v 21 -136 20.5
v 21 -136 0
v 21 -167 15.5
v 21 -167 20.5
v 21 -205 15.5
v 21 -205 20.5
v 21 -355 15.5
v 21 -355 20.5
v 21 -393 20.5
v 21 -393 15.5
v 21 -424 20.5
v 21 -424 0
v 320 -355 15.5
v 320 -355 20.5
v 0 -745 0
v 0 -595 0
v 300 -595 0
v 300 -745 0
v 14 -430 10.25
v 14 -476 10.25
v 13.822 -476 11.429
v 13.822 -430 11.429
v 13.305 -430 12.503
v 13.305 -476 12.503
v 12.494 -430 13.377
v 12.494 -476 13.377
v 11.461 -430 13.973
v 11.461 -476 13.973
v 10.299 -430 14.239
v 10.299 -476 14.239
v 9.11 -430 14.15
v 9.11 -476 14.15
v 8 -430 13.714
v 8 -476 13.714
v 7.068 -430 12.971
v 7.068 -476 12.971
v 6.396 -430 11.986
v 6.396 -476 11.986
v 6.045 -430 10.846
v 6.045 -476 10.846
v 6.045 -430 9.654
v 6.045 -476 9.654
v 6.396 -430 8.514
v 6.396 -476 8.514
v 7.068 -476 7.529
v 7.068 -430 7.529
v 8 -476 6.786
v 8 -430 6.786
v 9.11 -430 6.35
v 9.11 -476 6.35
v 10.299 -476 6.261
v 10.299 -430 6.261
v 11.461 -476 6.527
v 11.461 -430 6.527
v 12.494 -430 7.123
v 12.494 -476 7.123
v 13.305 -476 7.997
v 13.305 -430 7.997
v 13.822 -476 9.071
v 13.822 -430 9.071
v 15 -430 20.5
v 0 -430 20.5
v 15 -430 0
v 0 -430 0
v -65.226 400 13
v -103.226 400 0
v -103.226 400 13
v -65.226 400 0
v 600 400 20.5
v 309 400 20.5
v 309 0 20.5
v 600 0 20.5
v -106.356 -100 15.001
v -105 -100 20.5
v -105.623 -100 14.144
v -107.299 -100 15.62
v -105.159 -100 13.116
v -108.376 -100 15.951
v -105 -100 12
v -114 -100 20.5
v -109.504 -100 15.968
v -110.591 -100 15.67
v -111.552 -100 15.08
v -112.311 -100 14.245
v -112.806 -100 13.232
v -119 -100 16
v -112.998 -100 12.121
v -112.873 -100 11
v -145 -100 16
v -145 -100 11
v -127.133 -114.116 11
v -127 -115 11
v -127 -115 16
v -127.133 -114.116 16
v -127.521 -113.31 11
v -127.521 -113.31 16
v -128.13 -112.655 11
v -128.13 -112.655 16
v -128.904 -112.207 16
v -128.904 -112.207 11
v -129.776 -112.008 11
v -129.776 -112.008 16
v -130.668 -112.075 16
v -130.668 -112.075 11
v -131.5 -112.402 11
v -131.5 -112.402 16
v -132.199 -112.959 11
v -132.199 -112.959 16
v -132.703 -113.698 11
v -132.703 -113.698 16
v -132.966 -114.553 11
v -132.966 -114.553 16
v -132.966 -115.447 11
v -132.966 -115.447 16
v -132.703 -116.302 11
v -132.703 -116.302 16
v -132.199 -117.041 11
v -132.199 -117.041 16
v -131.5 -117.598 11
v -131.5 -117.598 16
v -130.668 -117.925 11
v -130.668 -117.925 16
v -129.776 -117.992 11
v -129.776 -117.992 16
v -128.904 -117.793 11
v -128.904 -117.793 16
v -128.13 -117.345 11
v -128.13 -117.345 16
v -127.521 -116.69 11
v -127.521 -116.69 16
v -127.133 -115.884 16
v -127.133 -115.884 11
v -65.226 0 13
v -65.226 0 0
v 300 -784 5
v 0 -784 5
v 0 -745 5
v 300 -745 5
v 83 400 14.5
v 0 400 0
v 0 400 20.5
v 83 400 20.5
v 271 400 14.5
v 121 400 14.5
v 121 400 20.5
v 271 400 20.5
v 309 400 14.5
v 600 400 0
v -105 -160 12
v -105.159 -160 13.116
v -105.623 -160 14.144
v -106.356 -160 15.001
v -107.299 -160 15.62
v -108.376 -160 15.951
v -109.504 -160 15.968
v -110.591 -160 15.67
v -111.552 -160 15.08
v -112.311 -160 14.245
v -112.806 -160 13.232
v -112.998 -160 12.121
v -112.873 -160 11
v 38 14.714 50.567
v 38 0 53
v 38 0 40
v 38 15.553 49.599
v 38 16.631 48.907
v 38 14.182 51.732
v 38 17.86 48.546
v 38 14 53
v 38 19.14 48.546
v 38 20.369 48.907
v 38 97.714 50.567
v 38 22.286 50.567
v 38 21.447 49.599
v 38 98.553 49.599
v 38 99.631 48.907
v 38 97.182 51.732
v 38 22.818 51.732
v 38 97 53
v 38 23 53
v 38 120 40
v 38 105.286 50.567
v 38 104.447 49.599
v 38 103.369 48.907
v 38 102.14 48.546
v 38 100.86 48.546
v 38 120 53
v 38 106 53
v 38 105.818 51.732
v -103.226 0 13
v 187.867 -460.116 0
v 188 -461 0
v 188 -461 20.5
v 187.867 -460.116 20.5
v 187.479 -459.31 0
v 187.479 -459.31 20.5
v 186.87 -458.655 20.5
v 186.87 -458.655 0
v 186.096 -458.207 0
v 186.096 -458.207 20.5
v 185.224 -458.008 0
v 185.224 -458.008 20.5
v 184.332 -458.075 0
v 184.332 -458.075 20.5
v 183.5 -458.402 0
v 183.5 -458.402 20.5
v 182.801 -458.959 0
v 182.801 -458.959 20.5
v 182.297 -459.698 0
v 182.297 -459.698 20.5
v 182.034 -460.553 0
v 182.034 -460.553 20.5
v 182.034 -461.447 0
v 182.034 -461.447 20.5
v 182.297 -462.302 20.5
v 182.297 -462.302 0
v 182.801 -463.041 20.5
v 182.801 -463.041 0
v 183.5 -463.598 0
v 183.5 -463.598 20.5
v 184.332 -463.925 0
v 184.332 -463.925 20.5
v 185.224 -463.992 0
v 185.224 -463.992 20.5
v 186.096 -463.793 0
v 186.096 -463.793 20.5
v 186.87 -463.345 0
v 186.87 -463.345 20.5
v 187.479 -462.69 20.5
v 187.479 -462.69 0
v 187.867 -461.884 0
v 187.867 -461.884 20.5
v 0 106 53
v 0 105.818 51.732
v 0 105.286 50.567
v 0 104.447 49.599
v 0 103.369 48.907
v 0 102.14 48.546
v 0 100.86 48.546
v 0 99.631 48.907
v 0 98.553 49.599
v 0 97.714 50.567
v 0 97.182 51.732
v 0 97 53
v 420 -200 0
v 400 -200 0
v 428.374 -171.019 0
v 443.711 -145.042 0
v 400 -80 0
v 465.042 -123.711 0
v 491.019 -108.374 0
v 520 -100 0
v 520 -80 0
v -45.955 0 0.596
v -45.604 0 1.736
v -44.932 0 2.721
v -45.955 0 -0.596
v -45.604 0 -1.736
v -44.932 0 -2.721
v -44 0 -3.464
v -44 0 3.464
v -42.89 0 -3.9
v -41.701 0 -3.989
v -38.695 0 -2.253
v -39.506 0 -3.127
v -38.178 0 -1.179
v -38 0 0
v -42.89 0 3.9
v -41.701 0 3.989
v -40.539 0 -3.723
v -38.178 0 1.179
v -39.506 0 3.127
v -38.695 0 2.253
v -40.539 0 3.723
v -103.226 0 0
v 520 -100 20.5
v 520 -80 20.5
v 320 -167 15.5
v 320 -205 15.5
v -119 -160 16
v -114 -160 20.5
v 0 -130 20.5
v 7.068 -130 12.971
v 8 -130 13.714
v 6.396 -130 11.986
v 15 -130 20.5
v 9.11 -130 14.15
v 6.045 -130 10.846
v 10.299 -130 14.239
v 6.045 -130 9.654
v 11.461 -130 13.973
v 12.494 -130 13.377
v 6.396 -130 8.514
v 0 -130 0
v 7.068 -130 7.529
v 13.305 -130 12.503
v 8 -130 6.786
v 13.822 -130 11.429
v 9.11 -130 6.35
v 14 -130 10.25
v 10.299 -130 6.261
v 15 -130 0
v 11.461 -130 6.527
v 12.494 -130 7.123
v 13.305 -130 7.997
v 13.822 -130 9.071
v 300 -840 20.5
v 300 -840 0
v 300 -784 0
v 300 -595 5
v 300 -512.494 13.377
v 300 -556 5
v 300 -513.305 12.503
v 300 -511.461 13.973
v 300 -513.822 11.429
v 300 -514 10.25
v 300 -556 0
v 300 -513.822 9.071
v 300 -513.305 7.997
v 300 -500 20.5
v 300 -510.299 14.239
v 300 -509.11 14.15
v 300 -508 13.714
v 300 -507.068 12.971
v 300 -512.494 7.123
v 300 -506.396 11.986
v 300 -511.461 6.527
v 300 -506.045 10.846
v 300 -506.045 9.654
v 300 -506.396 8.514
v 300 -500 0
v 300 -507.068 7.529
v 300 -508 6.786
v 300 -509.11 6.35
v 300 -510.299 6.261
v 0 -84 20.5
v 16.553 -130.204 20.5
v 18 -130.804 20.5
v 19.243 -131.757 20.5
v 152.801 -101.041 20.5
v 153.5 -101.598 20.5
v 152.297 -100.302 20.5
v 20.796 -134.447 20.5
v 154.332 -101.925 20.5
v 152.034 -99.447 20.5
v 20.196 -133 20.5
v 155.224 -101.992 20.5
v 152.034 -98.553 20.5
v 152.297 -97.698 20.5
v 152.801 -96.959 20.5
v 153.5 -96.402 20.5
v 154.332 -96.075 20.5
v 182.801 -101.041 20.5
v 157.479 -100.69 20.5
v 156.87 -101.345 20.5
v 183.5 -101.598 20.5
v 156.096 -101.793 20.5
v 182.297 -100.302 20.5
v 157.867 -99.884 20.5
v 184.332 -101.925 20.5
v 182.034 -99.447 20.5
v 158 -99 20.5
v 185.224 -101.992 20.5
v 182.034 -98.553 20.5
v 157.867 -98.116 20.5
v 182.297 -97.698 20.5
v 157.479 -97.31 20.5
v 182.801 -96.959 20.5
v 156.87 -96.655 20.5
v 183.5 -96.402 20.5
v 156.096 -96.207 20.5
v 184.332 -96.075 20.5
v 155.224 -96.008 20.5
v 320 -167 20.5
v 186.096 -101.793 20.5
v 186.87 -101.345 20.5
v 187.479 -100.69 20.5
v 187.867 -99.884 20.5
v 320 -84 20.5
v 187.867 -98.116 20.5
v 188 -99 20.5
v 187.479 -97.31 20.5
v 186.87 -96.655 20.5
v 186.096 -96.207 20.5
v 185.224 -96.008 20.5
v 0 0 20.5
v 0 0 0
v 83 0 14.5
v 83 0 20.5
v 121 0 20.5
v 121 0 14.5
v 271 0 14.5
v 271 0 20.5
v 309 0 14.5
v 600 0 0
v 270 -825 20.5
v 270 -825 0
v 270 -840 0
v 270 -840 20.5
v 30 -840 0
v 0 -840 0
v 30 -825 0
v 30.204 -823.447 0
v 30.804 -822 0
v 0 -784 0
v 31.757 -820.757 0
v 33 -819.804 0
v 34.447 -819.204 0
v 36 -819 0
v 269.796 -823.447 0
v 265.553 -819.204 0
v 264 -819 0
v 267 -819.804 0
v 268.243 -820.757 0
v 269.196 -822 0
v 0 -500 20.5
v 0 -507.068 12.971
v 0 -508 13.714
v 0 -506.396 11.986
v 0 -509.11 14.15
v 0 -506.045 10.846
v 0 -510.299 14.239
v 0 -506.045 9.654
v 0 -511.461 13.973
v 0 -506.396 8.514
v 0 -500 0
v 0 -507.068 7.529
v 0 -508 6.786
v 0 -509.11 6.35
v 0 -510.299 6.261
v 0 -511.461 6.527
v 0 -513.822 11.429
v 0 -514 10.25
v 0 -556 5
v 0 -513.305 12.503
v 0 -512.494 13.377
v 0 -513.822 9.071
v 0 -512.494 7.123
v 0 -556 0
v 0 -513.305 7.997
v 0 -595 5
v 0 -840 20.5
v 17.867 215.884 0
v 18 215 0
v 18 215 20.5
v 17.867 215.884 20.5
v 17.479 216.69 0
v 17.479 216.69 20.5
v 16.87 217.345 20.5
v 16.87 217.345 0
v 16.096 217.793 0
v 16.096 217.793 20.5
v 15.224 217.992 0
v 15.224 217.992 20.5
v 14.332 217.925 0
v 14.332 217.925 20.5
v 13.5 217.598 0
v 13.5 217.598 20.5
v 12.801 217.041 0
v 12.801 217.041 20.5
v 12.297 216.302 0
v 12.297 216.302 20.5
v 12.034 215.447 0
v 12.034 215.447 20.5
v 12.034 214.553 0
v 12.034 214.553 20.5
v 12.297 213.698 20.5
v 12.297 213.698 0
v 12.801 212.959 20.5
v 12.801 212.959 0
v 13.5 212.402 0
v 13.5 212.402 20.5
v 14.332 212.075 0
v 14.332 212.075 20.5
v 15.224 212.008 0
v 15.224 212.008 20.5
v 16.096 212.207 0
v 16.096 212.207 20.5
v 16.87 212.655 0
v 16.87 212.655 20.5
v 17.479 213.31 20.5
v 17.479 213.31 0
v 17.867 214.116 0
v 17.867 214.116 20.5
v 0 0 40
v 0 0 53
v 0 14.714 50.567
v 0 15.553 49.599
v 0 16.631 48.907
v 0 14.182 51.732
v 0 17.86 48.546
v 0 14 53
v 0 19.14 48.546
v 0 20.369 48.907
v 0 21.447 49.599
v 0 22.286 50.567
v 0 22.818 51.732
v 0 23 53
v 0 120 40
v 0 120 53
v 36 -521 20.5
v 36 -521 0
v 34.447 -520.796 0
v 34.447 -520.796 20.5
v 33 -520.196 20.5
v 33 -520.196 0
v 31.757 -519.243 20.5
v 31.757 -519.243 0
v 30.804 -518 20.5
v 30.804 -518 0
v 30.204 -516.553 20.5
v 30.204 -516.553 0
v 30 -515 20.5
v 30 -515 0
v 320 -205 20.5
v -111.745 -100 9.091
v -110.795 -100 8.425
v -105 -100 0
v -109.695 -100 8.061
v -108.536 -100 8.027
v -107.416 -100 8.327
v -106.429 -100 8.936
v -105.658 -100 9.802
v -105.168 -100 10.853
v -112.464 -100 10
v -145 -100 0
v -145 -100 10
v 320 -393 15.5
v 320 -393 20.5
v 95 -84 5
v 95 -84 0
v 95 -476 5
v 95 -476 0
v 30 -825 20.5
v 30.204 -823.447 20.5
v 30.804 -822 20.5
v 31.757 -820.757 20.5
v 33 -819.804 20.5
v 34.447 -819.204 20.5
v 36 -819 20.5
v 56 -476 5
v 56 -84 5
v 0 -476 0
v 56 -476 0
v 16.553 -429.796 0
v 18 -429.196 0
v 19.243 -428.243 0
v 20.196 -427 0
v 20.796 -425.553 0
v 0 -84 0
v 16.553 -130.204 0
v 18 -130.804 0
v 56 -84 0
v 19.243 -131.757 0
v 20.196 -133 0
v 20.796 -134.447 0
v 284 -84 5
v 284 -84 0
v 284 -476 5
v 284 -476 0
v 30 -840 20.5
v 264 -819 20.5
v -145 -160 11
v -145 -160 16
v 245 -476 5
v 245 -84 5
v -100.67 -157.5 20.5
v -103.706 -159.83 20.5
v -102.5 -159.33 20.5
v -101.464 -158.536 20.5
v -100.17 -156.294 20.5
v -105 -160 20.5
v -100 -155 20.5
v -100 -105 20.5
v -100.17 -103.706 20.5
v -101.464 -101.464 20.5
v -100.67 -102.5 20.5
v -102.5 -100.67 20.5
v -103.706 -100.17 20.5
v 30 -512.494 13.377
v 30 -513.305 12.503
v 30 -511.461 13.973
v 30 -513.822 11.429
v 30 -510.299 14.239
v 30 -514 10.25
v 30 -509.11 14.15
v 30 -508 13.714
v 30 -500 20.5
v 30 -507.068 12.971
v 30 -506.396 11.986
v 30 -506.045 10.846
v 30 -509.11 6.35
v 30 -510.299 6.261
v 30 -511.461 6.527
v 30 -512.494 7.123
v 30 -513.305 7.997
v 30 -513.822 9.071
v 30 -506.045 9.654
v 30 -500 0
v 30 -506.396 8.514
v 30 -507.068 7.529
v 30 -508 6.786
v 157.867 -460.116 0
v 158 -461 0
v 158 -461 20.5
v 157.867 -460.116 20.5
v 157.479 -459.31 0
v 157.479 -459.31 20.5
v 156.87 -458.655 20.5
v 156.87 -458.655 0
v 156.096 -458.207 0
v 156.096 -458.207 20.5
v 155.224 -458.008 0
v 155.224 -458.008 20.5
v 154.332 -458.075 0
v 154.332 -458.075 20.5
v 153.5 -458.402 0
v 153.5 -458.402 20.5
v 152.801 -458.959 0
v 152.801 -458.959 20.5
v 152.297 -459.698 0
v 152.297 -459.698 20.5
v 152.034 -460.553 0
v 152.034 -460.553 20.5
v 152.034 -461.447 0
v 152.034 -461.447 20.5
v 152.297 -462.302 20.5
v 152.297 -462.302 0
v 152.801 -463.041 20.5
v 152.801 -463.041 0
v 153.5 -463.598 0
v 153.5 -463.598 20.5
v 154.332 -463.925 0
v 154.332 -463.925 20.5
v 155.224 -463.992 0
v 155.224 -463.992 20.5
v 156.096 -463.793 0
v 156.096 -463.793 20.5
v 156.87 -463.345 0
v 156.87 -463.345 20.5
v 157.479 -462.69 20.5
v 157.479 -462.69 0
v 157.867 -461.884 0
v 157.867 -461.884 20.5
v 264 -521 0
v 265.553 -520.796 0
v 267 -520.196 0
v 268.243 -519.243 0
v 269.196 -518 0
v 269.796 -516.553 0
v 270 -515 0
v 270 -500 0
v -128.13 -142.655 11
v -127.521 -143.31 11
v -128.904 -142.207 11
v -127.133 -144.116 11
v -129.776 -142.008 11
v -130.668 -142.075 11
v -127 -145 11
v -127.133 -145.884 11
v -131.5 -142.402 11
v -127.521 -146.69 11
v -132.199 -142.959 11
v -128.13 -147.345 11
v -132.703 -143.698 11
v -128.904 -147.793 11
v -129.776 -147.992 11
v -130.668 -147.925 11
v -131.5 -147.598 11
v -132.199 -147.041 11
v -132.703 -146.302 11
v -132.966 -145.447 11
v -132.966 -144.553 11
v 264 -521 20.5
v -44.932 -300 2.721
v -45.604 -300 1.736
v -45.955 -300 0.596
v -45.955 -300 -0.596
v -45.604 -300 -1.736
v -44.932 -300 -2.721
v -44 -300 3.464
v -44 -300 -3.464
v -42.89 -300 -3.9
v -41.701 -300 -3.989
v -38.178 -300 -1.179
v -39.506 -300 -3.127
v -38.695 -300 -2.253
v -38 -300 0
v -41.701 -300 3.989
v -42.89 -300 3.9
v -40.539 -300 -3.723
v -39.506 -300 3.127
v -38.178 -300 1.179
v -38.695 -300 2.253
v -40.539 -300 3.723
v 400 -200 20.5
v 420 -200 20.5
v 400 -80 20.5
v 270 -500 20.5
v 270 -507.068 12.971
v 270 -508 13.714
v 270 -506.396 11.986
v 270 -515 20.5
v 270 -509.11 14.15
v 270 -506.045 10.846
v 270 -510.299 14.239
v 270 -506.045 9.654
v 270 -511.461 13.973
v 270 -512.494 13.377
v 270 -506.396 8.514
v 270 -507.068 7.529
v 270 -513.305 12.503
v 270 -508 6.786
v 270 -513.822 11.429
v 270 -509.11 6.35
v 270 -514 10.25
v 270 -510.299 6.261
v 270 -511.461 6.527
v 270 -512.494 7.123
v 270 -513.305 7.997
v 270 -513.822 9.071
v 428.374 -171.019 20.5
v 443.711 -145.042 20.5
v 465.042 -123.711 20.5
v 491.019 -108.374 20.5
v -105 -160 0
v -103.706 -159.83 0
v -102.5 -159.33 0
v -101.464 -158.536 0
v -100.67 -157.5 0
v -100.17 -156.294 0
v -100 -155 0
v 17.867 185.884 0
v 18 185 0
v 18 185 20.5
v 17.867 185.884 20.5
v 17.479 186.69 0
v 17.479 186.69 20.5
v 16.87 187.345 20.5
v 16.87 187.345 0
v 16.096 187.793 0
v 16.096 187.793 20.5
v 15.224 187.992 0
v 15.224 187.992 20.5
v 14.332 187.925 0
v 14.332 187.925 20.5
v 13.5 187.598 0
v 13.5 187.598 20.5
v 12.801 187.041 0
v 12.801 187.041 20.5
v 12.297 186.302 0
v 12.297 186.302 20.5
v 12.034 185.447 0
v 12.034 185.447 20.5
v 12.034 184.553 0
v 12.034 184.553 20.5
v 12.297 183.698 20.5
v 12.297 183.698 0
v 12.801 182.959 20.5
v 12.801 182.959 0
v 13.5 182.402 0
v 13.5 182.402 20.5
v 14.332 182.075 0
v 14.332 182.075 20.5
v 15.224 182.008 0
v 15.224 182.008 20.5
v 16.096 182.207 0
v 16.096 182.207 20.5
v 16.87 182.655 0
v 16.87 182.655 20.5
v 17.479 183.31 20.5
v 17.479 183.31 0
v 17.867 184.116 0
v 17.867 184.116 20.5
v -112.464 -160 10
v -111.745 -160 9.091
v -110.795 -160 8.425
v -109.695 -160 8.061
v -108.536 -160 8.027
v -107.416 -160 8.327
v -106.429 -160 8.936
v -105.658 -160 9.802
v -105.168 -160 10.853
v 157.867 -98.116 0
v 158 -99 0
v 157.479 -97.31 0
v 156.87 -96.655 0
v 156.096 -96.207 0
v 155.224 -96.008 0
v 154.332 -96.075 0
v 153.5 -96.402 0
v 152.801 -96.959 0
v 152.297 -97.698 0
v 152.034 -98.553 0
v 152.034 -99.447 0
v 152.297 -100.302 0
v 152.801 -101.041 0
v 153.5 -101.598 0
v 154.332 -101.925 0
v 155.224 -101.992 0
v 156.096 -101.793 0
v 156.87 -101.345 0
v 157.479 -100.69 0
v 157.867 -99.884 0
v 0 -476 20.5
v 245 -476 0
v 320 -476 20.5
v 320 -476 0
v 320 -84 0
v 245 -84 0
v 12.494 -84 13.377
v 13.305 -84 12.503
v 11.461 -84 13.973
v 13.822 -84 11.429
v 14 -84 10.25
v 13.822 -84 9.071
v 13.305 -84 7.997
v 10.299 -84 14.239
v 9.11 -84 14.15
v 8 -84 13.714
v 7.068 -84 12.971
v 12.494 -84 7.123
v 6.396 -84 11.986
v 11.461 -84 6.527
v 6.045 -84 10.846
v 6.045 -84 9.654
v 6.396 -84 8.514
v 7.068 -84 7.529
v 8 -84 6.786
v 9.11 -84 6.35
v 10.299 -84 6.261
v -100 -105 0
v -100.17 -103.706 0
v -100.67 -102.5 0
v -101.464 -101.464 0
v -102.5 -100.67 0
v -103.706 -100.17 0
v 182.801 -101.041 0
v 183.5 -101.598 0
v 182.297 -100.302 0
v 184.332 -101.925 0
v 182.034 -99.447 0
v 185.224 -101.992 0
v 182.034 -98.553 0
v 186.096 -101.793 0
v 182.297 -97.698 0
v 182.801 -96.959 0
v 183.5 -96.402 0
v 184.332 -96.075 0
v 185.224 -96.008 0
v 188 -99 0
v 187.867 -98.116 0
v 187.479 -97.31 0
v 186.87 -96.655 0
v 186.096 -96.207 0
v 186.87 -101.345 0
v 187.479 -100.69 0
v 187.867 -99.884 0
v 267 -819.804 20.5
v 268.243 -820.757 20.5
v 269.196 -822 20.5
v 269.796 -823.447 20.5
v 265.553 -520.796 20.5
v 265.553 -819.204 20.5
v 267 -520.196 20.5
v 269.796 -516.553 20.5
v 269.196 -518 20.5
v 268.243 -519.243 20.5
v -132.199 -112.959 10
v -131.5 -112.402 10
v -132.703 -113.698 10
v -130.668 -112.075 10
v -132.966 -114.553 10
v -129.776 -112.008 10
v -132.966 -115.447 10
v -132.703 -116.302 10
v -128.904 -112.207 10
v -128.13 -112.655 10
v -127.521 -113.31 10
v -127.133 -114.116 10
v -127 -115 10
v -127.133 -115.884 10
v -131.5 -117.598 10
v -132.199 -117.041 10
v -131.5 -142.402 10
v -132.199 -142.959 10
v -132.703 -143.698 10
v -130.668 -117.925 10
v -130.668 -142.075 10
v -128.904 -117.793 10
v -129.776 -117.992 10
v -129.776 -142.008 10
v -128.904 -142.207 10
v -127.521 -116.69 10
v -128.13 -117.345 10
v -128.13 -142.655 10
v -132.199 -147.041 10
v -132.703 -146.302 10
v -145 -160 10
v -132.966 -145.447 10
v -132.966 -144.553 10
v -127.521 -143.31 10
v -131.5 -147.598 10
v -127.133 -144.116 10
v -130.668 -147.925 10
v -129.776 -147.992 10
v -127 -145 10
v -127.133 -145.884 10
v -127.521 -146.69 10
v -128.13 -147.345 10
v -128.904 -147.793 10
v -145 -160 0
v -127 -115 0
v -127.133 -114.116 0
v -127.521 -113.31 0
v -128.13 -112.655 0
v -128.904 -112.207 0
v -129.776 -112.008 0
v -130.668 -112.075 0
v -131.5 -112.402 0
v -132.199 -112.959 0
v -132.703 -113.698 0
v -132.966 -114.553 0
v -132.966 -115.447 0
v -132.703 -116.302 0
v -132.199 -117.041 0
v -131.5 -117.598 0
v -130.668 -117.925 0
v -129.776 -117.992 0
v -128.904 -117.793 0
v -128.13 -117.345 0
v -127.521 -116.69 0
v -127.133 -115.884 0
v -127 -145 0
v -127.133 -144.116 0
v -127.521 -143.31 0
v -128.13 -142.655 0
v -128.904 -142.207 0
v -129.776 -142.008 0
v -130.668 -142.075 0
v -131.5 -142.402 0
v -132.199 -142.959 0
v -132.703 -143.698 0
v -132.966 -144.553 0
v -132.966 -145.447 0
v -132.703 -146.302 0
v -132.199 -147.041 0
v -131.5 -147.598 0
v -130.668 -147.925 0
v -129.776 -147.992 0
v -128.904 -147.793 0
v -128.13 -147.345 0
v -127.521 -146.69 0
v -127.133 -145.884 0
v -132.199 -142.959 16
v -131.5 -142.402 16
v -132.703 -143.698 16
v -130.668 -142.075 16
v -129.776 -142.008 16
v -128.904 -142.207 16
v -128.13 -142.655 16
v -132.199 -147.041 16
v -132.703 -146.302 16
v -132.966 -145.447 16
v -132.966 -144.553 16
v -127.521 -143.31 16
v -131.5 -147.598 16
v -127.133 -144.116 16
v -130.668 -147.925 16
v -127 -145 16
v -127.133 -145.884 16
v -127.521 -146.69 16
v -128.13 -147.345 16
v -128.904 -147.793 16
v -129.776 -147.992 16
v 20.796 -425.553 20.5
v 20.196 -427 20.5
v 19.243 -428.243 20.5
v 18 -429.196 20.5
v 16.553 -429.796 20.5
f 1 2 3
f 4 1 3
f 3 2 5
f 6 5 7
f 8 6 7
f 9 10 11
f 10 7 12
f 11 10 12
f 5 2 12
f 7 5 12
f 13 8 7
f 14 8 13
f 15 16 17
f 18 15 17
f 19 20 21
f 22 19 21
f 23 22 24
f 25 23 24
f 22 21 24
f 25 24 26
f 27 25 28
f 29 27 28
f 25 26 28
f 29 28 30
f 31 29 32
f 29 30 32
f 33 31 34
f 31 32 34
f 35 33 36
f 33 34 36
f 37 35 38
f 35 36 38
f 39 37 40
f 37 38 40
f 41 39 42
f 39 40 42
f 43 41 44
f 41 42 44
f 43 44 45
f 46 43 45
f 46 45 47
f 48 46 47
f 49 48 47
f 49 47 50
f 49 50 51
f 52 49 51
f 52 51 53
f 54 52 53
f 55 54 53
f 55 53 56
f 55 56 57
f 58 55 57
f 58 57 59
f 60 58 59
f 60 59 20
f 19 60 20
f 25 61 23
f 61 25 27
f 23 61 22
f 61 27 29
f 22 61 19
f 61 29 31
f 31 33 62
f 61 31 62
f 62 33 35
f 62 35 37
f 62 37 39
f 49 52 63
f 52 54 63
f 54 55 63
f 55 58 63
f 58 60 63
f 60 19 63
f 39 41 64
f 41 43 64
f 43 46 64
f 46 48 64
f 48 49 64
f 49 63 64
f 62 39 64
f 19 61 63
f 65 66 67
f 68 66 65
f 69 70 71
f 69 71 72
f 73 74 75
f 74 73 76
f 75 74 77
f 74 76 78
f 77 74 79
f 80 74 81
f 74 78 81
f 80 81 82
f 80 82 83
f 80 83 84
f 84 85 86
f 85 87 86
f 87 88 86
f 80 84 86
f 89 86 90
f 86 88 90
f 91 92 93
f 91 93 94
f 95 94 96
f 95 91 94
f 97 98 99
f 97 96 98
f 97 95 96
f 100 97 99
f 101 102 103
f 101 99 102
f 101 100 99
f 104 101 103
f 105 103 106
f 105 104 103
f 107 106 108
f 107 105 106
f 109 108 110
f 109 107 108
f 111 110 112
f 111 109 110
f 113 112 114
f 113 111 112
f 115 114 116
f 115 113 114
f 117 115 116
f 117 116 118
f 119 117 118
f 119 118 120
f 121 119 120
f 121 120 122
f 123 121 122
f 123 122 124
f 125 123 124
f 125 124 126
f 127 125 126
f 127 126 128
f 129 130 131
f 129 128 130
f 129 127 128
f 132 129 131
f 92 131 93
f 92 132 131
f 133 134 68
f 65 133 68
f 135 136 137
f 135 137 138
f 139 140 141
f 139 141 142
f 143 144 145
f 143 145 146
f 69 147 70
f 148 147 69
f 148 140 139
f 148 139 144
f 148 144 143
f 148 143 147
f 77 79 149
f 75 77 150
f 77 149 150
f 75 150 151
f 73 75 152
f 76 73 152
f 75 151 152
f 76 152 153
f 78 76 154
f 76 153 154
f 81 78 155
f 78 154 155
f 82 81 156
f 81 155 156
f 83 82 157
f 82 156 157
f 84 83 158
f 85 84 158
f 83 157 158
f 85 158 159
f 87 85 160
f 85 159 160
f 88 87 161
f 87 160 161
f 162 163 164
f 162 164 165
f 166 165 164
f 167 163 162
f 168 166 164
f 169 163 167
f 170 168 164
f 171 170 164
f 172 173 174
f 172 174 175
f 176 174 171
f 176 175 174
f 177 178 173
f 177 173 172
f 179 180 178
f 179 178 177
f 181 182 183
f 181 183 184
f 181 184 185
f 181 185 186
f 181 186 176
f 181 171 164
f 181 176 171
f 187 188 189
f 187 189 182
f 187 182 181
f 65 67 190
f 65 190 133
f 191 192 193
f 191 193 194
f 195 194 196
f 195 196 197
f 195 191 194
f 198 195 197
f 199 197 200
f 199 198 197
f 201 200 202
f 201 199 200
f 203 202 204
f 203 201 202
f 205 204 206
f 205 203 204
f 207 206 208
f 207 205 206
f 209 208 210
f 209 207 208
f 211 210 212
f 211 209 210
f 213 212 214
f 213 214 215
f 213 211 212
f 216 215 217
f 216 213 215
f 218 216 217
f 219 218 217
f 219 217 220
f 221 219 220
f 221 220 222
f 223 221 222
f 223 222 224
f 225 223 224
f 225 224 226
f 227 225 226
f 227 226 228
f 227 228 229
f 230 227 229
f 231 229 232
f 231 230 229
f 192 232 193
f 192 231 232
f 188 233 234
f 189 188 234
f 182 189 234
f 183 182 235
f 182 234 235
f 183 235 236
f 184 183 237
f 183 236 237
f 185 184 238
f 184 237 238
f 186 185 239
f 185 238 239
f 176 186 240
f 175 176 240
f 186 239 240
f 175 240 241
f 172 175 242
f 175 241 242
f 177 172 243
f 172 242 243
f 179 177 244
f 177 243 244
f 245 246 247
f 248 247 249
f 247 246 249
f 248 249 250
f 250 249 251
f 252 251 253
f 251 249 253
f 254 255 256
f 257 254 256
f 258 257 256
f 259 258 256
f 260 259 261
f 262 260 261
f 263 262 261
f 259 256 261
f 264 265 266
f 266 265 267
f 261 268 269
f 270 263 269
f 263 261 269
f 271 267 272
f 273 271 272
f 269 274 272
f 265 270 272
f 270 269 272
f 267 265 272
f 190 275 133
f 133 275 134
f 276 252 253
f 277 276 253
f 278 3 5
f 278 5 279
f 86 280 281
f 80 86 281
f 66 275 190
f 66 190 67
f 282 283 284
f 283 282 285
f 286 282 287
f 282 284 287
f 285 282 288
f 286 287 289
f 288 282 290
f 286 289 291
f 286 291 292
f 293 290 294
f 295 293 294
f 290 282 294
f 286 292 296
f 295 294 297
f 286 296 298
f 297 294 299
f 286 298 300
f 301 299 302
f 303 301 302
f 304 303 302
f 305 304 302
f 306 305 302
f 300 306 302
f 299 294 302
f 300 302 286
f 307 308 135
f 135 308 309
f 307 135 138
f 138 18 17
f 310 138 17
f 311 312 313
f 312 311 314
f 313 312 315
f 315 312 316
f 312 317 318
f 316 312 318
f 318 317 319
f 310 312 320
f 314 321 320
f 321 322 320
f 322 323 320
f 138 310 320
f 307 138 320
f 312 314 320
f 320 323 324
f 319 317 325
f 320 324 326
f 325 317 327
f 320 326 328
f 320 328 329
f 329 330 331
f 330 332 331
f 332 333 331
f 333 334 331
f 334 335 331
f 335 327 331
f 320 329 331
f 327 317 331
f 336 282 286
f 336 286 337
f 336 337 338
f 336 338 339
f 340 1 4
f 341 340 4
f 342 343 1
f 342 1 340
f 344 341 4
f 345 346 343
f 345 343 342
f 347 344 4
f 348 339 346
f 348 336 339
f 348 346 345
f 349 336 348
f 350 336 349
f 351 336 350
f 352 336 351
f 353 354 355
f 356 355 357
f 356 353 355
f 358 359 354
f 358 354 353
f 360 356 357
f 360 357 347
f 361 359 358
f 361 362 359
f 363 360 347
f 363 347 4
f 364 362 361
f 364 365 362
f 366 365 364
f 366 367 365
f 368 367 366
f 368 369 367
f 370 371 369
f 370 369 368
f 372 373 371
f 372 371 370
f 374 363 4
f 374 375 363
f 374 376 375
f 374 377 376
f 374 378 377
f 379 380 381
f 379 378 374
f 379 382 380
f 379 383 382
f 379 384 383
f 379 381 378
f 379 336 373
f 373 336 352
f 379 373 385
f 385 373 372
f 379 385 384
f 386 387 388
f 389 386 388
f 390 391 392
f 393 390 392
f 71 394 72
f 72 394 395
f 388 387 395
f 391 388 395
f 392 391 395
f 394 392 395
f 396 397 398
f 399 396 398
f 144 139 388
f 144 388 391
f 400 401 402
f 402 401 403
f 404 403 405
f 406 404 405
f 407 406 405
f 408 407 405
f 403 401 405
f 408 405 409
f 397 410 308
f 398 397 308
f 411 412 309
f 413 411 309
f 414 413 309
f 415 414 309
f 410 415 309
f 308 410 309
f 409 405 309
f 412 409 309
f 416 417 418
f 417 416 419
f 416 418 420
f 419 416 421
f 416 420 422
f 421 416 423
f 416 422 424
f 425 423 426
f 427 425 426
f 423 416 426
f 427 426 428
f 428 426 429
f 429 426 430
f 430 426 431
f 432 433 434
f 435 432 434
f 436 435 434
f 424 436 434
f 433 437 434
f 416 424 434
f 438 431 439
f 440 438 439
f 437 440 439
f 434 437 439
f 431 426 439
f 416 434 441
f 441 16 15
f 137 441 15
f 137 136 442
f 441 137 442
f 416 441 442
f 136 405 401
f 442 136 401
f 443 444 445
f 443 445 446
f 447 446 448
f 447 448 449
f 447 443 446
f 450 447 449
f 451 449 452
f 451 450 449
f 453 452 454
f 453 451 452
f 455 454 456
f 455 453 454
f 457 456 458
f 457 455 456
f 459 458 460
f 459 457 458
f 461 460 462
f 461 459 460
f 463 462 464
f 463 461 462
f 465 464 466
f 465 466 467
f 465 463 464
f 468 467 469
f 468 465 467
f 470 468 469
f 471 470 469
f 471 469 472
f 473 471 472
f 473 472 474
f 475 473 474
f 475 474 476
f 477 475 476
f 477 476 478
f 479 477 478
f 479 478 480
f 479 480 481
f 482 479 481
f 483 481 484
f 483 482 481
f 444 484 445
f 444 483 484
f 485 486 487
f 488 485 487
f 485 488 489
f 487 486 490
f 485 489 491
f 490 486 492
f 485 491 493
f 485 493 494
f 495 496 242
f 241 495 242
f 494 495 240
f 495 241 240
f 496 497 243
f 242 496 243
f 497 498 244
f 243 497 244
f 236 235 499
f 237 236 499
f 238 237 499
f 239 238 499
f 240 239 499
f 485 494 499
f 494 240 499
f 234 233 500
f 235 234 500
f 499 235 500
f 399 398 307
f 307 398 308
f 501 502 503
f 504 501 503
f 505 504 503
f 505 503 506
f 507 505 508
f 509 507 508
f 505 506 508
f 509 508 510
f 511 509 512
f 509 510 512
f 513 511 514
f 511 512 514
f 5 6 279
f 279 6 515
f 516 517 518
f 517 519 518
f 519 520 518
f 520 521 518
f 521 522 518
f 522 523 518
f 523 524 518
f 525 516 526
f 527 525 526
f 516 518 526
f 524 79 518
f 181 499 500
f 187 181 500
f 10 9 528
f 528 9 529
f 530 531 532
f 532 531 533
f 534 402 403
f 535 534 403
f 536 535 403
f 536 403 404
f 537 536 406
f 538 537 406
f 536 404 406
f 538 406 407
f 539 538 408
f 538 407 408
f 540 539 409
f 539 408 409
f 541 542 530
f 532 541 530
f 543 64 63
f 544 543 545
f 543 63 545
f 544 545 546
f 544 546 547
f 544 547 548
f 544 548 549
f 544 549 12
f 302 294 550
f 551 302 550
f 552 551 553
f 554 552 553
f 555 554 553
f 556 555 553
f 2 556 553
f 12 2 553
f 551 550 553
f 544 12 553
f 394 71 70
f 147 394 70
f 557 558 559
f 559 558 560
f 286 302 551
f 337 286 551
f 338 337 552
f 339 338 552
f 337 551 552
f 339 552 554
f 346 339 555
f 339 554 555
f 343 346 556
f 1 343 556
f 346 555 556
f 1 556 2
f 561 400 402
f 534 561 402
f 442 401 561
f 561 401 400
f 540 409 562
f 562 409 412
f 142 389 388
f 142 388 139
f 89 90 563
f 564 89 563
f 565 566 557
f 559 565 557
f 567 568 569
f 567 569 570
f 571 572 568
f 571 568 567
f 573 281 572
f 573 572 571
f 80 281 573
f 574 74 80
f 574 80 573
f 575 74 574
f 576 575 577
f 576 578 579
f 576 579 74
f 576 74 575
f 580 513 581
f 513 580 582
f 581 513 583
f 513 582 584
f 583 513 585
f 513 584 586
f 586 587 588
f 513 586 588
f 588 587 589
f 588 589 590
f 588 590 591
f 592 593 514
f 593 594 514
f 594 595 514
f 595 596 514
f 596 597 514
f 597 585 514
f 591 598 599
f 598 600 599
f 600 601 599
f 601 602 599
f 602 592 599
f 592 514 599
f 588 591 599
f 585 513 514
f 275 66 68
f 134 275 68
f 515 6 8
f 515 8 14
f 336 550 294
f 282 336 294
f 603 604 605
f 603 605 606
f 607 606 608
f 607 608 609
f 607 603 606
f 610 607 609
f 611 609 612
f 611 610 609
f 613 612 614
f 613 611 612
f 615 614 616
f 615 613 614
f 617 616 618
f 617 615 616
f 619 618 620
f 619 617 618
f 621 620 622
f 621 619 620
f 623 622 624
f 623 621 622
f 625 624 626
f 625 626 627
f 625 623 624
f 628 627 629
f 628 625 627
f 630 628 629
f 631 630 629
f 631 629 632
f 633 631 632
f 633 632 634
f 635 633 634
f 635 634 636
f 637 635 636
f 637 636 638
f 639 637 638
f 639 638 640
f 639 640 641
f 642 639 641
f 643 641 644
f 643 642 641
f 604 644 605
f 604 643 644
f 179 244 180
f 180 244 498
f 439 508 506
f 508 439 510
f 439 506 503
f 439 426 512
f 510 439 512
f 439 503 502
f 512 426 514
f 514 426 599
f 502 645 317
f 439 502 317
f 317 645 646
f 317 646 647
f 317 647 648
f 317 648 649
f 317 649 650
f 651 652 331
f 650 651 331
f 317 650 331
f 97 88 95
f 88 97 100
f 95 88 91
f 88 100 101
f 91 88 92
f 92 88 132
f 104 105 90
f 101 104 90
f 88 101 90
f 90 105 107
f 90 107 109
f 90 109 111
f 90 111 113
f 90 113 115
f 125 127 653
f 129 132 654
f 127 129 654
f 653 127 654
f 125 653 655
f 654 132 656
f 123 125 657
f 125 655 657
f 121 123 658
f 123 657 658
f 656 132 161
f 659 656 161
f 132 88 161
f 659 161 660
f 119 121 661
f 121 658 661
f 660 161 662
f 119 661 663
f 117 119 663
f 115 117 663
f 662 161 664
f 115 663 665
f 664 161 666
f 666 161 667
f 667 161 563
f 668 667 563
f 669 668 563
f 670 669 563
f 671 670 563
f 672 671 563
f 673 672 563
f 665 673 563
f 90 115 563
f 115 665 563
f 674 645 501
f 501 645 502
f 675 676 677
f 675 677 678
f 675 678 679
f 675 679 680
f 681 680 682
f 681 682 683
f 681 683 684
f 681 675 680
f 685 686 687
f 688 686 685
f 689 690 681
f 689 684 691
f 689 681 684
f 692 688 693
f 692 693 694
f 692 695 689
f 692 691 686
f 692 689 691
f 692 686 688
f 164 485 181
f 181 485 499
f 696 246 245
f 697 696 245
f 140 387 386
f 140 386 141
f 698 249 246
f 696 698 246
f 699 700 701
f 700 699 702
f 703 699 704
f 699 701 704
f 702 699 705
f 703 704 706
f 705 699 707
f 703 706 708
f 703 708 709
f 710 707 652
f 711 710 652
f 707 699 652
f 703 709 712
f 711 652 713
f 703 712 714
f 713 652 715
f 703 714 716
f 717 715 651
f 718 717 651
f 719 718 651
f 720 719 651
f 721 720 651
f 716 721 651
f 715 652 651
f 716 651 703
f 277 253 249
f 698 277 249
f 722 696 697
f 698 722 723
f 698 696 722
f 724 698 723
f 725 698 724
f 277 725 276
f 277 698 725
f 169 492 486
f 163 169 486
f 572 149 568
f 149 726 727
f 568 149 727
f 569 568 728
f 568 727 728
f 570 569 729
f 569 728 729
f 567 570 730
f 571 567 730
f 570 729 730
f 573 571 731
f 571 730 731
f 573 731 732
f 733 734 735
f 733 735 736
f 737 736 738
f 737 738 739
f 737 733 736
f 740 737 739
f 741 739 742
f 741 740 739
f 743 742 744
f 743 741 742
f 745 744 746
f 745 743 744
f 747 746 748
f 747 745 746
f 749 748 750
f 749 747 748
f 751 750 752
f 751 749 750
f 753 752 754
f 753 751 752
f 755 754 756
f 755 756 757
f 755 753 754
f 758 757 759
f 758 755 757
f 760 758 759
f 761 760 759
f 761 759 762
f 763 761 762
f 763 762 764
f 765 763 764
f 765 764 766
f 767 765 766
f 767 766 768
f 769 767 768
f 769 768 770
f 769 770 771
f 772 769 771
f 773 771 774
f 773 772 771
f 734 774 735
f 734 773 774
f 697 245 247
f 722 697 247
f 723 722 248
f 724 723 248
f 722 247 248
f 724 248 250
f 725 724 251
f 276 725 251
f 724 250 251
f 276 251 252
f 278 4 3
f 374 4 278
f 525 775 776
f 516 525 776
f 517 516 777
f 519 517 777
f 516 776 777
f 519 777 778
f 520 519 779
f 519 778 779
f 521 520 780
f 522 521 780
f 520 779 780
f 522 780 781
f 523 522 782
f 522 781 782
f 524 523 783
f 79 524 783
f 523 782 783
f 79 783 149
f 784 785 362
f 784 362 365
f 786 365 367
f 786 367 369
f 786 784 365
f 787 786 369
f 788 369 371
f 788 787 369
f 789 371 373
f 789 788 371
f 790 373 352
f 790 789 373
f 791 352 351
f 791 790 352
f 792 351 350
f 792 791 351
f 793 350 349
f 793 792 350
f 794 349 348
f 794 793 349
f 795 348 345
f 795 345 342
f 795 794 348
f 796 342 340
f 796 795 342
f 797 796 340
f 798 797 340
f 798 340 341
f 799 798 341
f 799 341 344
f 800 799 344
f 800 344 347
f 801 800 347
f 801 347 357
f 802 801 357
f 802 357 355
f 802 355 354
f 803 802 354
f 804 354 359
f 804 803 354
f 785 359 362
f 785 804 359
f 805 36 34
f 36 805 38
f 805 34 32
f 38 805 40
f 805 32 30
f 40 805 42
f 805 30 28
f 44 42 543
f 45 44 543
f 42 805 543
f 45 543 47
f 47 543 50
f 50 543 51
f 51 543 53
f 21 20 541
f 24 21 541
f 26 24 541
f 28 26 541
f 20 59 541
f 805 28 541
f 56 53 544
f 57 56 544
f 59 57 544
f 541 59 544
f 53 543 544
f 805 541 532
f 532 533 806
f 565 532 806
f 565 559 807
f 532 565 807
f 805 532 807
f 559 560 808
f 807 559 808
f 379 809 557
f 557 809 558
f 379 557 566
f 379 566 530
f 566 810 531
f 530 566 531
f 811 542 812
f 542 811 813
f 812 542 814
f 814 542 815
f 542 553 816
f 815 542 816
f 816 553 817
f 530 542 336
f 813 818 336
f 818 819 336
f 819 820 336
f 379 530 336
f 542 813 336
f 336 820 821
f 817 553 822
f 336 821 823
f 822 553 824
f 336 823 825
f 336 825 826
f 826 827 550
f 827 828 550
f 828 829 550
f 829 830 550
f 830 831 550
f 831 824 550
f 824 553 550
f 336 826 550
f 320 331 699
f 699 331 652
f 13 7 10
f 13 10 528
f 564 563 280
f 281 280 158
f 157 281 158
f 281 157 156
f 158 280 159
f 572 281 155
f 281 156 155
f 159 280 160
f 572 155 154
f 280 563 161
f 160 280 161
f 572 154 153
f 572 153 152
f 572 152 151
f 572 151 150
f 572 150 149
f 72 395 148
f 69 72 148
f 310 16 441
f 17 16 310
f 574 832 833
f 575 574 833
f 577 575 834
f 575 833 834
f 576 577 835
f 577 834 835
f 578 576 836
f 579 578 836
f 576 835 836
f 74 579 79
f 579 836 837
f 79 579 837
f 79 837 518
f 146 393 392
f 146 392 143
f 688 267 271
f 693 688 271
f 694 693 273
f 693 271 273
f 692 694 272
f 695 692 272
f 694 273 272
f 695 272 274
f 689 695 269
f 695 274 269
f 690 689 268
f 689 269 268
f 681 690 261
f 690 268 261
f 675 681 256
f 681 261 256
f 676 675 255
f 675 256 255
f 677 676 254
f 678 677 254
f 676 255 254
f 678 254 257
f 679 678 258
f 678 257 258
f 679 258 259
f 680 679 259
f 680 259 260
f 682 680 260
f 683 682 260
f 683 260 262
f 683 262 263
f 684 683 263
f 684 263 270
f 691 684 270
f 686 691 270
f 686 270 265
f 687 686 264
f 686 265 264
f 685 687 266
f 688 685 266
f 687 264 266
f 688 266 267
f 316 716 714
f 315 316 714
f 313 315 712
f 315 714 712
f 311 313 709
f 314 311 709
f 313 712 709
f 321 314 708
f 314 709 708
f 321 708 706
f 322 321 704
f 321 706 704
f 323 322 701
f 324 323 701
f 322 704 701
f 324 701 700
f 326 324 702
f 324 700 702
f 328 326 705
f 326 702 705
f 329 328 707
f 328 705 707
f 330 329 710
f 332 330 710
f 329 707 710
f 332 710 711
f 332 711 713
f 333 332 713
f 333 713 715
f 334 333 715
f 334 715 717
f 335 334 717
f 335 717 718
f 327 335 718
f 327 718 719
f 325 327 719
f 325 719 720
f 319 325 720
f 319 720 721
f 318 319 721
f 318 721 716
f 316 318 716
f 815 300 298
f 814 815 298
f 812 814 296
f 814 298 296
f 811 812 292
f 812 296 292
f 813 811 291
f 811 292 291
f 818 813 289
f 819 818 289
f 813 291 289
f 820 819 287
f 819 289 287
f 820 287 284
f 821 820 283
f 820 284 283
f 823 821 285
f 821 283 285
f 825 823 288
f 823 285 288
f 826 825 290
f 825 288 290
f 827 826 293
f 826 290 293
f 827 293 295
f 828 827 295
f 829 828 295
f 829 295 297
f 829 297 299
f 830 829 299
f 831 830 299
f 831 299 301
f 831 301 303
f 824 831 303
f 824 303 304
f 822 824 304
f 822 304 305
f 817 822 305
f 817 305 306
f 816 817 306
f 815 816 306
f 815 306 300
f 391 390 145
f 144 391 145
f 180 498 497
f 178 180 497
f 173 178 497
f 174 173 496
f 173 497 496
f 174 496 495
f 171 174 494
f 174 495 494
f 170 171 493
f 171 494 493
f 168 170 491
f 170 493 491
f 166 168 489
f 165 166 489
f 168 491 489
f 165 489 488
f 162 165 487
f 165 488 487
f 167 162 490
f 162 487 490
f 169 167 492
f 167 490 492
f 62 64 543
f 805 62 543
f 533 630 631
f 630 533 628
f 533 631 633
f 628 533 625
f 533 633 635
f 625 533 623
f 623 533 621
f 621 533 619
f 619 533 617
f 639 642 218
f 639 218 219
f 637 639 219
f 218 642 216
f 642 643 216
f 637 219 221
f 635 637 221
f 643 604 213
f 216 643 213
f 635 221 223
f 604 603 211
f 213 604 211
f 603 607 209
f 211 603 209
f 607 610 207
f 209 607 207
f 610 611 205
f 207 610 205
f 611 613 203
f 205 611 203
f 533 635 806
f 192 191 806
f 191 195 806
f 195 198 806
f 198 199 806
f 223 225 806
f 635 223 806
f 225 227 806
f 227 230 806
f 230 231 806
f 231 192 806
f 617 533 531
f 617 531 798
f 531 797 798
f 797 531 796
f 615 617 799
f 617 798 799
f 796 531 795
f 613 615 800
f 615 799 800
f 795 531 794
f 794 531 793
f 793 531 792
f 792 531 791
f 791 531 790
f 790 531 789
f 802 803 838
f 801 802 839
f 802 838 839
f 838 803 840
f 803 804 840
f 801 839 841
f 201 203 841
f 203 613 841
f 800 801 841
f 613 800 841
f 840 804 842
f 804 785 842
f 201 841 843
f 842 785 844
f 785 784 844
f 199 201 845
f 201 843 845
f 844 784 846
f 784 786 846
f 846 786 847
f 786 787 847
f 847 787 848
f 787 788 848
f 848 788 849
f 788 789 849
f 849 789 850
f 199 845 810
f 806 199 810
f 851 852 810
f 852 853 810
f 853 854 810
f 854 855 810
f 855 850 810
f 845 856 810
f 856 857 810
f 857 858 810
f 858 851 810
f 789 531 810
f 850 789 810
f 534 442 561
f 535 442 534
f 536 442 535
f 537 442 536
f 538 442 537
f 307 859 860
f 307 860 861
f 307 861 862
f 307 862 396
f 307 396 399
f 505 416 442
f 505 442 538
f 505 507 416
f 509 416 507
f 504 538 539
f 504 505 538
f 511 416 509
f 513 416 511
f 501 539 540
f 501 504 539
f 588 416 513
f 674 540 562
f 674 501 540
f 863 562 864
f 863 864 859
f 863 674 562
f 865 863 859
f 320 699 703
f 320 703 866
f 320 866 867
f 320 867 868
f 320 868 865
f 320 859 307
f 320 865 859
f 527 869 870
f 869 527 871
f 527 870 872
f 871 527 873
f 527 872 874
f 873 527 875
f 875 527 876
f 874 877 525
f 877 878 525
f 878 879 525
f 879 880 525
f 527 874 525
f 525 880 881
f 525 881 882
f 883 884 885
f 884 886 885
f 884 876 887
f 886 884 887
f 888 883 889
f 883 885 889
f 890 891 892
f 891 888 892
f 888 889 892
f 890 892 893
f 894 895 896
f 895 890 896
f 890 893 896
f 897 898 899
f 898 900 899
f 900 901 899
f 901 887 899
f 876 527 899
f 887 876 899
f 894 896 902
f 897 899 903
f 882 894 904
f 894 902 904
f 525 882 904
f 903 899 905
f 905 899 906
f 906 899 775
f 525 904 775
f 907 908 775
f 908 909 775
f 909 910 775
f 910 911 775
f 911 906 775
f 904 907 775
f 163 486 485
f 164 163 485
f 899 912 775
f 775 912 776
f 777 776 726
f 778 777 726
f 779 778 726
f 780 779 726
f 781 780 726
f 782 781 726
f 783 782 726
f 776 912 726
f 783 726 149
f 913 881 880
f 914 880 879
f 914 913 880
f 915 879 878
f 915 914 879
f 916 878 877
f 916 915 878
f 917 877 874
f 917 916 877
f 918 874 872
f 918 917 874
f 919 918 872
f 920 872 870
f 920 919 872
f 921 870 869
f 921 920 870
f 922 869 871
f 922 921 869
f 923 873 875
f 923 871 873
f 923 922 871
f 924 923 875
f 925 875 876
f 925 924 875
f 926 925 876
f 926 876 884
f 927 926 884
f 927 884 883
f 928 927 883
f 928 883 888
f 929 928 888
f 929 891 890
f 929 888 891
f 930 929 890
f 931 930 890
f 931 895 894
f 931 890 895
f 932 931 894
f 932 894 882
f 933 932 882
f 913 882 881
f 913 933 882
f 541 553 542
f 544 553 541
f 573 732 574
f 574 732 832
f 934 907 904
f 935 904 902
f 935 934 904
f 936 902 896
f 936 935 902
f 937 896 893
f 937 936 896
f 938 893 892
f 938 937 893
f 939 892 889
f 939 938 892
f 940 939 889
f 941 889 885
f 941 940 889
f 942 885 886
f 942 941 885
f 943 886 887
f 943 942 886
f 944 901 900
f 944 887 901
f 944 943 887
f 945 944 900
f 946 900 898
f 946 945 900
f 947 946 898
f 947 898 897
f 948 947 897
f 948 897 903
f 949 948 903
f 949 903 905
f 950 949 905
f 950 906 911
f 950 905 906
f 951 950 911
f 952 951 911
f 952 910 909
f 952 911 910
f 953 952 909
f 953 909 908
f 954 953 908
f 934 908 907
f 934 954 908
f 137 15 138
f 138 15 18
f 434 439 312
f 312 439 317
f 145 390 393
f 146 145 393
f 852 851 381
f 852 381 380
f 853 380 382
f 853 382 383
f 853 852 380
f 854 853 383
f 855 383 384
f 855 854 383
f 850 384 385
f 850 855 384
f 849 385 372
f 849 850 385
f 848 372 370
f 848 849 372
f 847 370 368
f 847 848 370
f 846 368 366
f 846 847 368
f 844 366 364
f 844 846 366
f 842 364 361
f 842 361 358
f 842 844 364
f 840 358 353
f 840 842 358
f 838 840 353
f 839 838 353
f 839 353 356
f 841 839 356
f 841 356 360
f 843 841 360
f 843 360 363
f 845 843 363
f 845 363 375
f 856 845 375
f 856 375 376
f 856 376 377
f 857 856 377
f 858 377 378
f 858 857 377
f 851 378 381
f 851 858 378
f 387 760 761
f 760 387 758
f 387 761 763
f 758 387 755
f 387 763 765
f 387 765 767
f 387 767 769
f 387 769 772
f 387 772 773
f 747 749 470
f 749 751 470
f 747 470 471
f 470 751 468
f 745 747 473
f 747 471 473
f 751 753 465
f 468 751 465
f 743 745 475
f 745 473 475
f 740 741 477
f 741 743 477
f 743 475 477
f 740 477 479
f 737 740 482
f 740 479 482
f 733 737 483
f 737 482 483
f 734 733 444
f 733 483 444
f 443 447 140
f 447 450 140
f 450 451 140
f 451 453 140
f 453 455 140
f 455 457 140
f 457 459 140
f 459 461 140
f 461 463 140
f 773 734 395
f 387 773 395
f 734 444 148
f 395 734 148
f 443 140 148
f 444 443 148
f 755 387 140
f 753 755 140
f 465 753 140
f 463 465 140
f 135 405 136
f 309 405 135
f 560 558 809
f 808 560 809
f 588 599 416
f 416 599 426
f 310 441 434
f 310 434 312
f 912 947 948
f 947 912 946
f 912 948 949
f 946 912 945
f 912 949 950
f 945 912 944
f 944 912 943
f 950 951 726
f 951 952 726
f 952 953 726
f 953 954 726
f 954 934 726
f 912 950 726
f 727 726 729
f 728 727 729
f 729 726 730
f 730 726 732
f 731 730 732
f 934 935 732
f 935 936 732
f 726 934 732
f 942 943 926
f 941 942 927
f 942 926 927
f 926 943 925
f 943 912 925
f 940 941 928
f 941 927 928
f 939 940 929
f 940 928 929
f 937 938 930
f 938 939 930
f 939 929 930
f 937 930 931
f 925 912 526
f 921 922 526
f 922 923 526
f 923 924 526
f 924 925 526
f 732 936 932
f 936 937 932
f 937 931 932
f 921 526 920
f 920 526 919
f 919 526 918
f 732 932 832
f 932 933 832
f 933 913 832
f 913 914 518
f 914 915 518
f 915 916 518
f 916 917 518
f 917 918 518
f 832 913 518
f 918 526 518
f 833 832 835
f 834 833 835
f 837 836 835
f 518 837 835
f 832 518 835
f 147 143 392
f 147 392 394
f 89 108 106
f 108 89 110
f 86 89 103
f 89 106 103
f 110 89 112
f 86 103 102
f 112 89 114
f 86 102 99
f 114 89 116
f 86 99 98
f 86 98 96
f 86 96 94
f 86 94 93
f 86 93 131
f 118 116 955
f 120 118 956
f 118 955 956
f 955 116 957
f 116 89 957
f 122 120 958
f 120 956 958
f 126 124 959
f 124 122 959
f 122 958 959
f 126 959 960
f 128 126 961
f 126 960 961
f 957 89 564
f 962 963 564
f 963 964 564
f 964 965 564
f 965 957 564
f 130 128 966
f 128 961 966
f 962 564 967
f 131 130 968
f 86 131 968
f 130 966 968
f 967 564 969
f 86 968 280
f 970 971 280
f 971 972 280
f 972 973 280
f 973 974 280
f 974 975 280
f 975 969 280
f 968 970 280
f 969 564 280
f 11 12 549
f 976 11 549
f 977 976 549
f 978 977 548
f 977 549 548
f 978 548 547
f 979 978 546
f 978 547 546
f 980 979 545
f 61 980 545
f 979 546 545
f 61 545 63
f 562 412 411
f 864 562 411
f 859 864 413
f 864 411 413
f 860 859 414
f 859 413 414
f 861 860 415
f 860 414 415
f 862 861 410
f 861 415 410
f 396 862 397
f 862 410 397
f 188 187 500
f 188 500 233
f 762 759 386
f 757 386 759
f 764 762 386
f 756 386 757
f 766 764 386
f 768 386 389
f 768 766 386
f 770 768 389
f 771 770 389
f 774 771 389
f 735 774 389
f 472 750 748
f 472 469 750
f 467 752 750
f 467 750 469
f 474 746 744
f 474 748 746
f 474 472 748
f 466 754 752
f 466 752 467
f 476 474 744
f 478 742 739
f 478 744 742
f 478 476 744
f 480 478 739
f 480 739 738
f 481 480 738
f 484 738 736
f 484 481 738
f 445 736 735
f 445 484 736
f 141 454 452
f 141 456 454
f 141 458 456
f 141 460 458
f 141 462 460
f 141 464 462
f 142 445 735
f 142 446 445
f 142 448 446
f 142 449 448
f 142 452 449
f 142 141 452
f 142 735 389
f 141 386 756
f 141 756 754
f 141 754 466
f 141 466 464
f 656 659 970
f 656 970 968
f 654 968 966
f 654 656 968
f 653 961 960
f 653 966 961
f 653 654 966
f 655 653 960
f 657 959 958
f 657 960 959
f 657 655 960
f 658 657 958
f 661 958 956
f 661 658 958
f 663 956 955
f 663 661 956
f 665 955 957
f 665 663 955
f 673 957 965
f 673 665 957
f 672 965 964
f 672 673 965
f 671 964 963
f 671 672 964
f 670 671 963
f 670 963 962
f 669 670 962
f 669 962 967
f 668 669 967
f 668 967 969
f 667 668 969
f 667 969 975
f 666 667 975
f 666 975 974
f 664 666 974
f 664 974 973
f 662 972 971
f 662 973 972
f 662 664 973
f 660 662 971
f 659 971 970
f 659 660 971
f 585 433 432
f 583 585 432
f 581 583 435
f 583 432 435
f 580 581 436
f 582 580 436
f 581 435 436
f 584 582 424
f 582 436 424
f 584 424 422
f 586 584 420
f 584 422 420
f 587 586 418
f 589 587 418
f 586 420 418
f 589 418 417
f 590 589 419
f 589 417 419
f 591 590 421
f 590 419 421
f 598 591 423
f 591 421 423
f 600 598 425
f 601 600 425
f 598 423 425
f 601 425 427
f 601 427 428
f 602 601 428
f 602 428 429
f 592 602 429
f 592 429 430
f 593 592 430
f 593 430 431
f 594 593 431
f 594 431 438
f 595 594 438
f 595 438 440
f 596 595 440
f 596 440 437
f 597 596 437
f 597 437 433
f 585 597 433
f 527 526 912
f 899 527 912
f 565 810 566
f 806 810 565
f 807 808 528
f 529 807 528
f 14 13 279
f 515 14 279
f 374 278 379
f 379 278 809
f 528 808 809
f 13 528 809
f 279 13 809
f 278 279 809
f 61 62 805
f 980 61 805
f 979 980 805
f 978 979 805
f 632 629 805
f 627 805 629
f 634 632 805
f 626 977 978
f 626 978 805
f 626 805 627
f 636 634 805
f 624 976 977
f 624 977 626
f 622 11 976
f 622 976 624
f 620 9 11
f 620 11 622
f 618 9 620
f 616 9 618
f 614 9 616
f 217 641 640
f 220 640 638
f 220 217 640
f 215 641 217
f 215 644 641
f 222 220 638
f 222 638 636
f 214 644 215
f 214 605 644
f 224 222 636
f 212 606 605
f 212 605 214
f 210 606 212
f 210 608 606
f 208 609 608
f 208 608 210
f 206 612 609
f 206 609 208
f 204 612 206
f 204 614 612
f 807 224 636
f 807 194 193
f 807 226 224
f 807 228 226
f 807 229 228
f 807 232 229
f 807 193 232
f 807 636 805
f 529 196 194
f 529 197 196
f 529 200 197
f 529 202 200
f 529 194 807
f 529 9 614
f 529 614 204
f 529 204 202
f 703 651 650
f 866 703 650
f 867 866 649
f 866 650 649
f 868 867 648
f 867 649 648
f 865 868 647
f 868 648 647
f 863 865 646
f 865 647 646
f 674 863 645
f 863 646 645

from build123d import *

# Parameters (mm, degrees)
F0_W      = 600
F0_H      = 400
F0_R      = 3
F1_DEPTH  = 20.5
F2_W      = 38
F2_H      = 400
F3_DEPTH  = 6
F4_W      = 38
F4_H      = 400
F5_DEPTH  = 13
F6_R      = 3
F7_DEPTH  = 20.5
F8_W      = 39
F8_H      = 392
F9_DEPTH  = 5
F10_W     = 299
F10_H     = 38
F11_DEPTH = 5
F13_DEPTH = 20.5
F14_W     = 300
F14_H     = 39
F15_DEPTH = 5
F16_R     = 4
F17_DEPTH = 392
F18_R     = 3
F19_DEPTH = 20.5
F21_DEPTH = 60
F22_R     = 4
F23_DEPTH = 300
F24_R     = 4
F25_DEPTH = 300
F27_DEPTH = 20.5
F29_DEPTH = 38


with BuildPart() as f1:
    # F0 (on Top) → F1 (new body)
    with BuildSketch(Plane.XY):
        with Locations((300, 200)):
            Rectangle(F0_W, F0_H)
        with Locations((15, 185)):
            Circle(F0_R, mode=Mode.SUBTRACT)
        with Locations((15, 215)):
            Circle(F0_R, mode=Mode.SUBTRACT)
    extrude(amount=F1_DEPTH)

    # F2 (on face) → F3 (cut)
    with BuildSketch(Plane.XY.offset(20.5)):
        with Locations((290, 200)):
            Rectangle(F2_W, F2_H)
        with Locations((102, 200)):
            Rectangle(F2_W, F2_H)
    extrude(amount=-F3_DEPTH, mode=Mode.SUBTRACT)


with BuildPart() as f5:
    # F4 (on Top) → F5 (new body)
    with BuildSketch(Plane.XY):
        with Locations((-84.2256782055, 200)):
            Rectangle(F4_W, F4_H)
    extrude(amount=F5_DEPTH)


with BuildPart() as f7:
    # F6 (on Top) → F7 (new body)
    with BuildSketch(Plane.XY):
        with BuildLine():
            Line((320, -84), (0, -84))
            Line((0, -84), (0, -130))
            Line((0, -130), (15, -130))
            ThreePointArc((15, -130), (19.2426406871, -131.7573593129), (21, -136))
            Line((21, -136), (21, -424))
            ThreePointArc((21, -424), (19.2426406871, -428.2426406871), (15, -430))
            Line((15, -430), (0, -430))
            Line((0, -430), (0, -476))
            Line((0, -476), (320, -476))
            Line((320, -476), (320, -84))
        make_face()
        with Locations((155, -461)):
            Circle(F6_R, mode=Mode.SUBTRACT)
        with Locations((185, -461)):
            Circle(F6_R, mode=Mode.SUBTRACT)
        with Locations((155, -99)):
            Circle(F6_R, mode=Mode.SUBTRACT)
        with Locations((185, -99)):
            Circle(F6_R, mode=Mode.SUBTRACT)
    extrude(amount=F7_DEPTH)

    # F8 (on face) → F9 (cut)
    with BuildSketch(Plane(origin=(0, 0, 0), x_dir=(1, 0, 0), z_dir=(0, 0, -1))):
        with Locations((264.5, 280)):
            Rectangle(F8_W, F8_H)
        with Locations((75.5, 280)):
            Rectangle(F8_W, F8_H)
    extrude(amount=-F9_DEPTH, mode=Mode.SUBTRACT)

    # F10 (on face) → F11 (cut)
    with BuildSketch(Plane.XY.offset(20.5)):
        with Locations((170.5, -186)):
            Rectangle(F10_W, F10_H)
        with Locations((170.5, -374)):
            Rectangle(F10_W, F10_H)
    extrude(amount=-F11_DEPTH, mode=Mode.SUBTRACT)

    # F16 (on face) → F17 (cut, through all)
    with BuildSketch(Plane.XZ.offset(476)):
        with Locations((10, 10.25)):
            Circle(F16_R)
    extrude(amount=-F17_DEPTH, mode=Mode.SUBTRACT)


with BuildPart() as f13:
    # F12 (on Top) → F13 (new body)
    with BuildSketch(Plane.XY):
        with BuildLine():
            Line((30, -500), (0, -500))
            Line((0, -500), (0, -840))
            Line((0, -840), (30, -840))
            Line((30, -840), (30, -825))
            ThreePointArc((30, -825), (31.7573593129, -820.7573593129), (36, -819))
            Line((36, -819), (264, -819))
            ThreePointArc((264, -819), (268.2426406871, -820.7573593129), (270, -825))
            Line((270, -825), (270, -840))
            Line((270, -840), (300, -840))
            Line((300, -840), (300, -500))
            Line((300, -500), (270, -500))
            Line((270, -500), (270, -515))
            ThreePointArc((270, -515), (268.2426406871, -519.2426406871), (264, -521))
            Line((264, -521), (36, -521))
            ThreePointArc((36, -521), (31.7573593129, -519.2426406871), (30, -515))
            Line((30, -515), (30, -500))
        make_face()
    extrude(amount=F13_DEPTH)

    # F14 (on face) → F15 (cut)
    with BuildSketch(Plane(origin=(0, 0, 0), x_dir=(1, 0, 0), z_dir=(0, 0, -1))):
        with Locations((150, 764.5)):
            Rectangle(F14_W, F14_H)
        with Locations((150, 575.5)):
            Rectangle(F14_W, F14_H)
    extrude(amount=-F15_DEPTH, mode=Mode.SUBTRACT)

    # F22 (on face) → F23 (cut, through all)
    with BuildSketch(Plane(origin=(0, 0, 0), x_dir=(0, -1, 0), z_dir=(-1, 0, 0))):
        with Locations((510, 10.25)):
            Circle(F22_R)
    extrude(amount=-F23_DEPTH, mode=Mode.SUBTRACT)


with BuildPart() as f19:
    # F18 (on Top) → F19 (new body)
    with BuildSketch(Plane.XY):
        with BuildLine():
            ThreePointArc((-100, -105), (-101.4644660941, -101.4644660941), (-105, -100))
            Line((-105, -100), (-145, -100))
            Line((-145, -100), (-145, -160))
            Line((-145, -160), (-105, -160))
            ThreePointArc((-105, -160), (-101.4644660941, -158.5355339059), (-100, -155))
            Line((-100, -155), (-100, -105))
        make_face()
        with Locations((-130, -145)):
            Circle(F18_R, mode=Mode.SUBTRACT)
        with Locations((-130, -115)):
            Circle(F18_R, mode=Mode.SUBTRACT)
    extrude(amount=F19_DEPTH)

    # F20 (on face) → F21 (cut, through all)
    with BuildSketch(Plane.XZ.offset(160)):
        with BuildLine():
            Line((-112.8729833462, 11), (-145, 11))
            Line((-145, 11), (-145, 10))
            Line((-145, 10), (-112.4641016151, 10))
            ThreePointArc((-112.4641016151, 10), (-107.9647238196, 8.1362966948), (-105, 12))
            ThreePointArc((-105, 12), (-109.5040171699, 15.9681187851), (-112.8729833462, 11))
        make_face()
        Polygon((-145, 20.5), (-145, 16), (-119, 16), (-114, 20.5), align=None)
    extrude(amount=-F21_DEPTH, mode=Mode.SUBTRACT)


with BuildPart() as f25:
    # F24 (on Front) → F25 (new body)
    with BuildSketch(Plane.XZ):
        with Locations((-42, 0)):
            Circle(F24_R)
    extrude(amount=F25_DEPTH)


with BuildPart() as f27:
    # F26 (on Top) → F27 (new body)
    with BuildSketch(Plane.XY):
        with BuildLine():
            Line((520, -80), (400, -80))
            Line((400, -80), (400, -200))
            Line((400, -200), (420, -200))
            ThreePointArc((420, -200), (453.7037322616, -133.7037322616), (520, -100))
            Line((520, -100), (520, -80))
        make_face()
    extrude(amount=F27_DEPTH)


with BuildPart() as f29:
    # F28 (on Right) → F29 (new body)
    with BuildSketch(Plane.YZ):
        with BuildLine():
            Line((0, 53), (0, 40))
            Line((0, 40), (120, 40))
            Line((120, 40), (120, 53))
            Line((120, 53), (106, 53))
            ThreePointArc((106, 53), (101.5, 48.5), (97, 53))
            Line((97, 53), (23, 53))
            ThreePointArc((23, 53), (18.5, 48.5), (14, 53))
            Line((14, 53), (0, 53))
        make_face()
    extrude(amount=F29_DEPTH)


solid = Compound([f1.part, f5.part, f7.part, f13.part, f19.part, f25.part, f27.part, f29.part])
